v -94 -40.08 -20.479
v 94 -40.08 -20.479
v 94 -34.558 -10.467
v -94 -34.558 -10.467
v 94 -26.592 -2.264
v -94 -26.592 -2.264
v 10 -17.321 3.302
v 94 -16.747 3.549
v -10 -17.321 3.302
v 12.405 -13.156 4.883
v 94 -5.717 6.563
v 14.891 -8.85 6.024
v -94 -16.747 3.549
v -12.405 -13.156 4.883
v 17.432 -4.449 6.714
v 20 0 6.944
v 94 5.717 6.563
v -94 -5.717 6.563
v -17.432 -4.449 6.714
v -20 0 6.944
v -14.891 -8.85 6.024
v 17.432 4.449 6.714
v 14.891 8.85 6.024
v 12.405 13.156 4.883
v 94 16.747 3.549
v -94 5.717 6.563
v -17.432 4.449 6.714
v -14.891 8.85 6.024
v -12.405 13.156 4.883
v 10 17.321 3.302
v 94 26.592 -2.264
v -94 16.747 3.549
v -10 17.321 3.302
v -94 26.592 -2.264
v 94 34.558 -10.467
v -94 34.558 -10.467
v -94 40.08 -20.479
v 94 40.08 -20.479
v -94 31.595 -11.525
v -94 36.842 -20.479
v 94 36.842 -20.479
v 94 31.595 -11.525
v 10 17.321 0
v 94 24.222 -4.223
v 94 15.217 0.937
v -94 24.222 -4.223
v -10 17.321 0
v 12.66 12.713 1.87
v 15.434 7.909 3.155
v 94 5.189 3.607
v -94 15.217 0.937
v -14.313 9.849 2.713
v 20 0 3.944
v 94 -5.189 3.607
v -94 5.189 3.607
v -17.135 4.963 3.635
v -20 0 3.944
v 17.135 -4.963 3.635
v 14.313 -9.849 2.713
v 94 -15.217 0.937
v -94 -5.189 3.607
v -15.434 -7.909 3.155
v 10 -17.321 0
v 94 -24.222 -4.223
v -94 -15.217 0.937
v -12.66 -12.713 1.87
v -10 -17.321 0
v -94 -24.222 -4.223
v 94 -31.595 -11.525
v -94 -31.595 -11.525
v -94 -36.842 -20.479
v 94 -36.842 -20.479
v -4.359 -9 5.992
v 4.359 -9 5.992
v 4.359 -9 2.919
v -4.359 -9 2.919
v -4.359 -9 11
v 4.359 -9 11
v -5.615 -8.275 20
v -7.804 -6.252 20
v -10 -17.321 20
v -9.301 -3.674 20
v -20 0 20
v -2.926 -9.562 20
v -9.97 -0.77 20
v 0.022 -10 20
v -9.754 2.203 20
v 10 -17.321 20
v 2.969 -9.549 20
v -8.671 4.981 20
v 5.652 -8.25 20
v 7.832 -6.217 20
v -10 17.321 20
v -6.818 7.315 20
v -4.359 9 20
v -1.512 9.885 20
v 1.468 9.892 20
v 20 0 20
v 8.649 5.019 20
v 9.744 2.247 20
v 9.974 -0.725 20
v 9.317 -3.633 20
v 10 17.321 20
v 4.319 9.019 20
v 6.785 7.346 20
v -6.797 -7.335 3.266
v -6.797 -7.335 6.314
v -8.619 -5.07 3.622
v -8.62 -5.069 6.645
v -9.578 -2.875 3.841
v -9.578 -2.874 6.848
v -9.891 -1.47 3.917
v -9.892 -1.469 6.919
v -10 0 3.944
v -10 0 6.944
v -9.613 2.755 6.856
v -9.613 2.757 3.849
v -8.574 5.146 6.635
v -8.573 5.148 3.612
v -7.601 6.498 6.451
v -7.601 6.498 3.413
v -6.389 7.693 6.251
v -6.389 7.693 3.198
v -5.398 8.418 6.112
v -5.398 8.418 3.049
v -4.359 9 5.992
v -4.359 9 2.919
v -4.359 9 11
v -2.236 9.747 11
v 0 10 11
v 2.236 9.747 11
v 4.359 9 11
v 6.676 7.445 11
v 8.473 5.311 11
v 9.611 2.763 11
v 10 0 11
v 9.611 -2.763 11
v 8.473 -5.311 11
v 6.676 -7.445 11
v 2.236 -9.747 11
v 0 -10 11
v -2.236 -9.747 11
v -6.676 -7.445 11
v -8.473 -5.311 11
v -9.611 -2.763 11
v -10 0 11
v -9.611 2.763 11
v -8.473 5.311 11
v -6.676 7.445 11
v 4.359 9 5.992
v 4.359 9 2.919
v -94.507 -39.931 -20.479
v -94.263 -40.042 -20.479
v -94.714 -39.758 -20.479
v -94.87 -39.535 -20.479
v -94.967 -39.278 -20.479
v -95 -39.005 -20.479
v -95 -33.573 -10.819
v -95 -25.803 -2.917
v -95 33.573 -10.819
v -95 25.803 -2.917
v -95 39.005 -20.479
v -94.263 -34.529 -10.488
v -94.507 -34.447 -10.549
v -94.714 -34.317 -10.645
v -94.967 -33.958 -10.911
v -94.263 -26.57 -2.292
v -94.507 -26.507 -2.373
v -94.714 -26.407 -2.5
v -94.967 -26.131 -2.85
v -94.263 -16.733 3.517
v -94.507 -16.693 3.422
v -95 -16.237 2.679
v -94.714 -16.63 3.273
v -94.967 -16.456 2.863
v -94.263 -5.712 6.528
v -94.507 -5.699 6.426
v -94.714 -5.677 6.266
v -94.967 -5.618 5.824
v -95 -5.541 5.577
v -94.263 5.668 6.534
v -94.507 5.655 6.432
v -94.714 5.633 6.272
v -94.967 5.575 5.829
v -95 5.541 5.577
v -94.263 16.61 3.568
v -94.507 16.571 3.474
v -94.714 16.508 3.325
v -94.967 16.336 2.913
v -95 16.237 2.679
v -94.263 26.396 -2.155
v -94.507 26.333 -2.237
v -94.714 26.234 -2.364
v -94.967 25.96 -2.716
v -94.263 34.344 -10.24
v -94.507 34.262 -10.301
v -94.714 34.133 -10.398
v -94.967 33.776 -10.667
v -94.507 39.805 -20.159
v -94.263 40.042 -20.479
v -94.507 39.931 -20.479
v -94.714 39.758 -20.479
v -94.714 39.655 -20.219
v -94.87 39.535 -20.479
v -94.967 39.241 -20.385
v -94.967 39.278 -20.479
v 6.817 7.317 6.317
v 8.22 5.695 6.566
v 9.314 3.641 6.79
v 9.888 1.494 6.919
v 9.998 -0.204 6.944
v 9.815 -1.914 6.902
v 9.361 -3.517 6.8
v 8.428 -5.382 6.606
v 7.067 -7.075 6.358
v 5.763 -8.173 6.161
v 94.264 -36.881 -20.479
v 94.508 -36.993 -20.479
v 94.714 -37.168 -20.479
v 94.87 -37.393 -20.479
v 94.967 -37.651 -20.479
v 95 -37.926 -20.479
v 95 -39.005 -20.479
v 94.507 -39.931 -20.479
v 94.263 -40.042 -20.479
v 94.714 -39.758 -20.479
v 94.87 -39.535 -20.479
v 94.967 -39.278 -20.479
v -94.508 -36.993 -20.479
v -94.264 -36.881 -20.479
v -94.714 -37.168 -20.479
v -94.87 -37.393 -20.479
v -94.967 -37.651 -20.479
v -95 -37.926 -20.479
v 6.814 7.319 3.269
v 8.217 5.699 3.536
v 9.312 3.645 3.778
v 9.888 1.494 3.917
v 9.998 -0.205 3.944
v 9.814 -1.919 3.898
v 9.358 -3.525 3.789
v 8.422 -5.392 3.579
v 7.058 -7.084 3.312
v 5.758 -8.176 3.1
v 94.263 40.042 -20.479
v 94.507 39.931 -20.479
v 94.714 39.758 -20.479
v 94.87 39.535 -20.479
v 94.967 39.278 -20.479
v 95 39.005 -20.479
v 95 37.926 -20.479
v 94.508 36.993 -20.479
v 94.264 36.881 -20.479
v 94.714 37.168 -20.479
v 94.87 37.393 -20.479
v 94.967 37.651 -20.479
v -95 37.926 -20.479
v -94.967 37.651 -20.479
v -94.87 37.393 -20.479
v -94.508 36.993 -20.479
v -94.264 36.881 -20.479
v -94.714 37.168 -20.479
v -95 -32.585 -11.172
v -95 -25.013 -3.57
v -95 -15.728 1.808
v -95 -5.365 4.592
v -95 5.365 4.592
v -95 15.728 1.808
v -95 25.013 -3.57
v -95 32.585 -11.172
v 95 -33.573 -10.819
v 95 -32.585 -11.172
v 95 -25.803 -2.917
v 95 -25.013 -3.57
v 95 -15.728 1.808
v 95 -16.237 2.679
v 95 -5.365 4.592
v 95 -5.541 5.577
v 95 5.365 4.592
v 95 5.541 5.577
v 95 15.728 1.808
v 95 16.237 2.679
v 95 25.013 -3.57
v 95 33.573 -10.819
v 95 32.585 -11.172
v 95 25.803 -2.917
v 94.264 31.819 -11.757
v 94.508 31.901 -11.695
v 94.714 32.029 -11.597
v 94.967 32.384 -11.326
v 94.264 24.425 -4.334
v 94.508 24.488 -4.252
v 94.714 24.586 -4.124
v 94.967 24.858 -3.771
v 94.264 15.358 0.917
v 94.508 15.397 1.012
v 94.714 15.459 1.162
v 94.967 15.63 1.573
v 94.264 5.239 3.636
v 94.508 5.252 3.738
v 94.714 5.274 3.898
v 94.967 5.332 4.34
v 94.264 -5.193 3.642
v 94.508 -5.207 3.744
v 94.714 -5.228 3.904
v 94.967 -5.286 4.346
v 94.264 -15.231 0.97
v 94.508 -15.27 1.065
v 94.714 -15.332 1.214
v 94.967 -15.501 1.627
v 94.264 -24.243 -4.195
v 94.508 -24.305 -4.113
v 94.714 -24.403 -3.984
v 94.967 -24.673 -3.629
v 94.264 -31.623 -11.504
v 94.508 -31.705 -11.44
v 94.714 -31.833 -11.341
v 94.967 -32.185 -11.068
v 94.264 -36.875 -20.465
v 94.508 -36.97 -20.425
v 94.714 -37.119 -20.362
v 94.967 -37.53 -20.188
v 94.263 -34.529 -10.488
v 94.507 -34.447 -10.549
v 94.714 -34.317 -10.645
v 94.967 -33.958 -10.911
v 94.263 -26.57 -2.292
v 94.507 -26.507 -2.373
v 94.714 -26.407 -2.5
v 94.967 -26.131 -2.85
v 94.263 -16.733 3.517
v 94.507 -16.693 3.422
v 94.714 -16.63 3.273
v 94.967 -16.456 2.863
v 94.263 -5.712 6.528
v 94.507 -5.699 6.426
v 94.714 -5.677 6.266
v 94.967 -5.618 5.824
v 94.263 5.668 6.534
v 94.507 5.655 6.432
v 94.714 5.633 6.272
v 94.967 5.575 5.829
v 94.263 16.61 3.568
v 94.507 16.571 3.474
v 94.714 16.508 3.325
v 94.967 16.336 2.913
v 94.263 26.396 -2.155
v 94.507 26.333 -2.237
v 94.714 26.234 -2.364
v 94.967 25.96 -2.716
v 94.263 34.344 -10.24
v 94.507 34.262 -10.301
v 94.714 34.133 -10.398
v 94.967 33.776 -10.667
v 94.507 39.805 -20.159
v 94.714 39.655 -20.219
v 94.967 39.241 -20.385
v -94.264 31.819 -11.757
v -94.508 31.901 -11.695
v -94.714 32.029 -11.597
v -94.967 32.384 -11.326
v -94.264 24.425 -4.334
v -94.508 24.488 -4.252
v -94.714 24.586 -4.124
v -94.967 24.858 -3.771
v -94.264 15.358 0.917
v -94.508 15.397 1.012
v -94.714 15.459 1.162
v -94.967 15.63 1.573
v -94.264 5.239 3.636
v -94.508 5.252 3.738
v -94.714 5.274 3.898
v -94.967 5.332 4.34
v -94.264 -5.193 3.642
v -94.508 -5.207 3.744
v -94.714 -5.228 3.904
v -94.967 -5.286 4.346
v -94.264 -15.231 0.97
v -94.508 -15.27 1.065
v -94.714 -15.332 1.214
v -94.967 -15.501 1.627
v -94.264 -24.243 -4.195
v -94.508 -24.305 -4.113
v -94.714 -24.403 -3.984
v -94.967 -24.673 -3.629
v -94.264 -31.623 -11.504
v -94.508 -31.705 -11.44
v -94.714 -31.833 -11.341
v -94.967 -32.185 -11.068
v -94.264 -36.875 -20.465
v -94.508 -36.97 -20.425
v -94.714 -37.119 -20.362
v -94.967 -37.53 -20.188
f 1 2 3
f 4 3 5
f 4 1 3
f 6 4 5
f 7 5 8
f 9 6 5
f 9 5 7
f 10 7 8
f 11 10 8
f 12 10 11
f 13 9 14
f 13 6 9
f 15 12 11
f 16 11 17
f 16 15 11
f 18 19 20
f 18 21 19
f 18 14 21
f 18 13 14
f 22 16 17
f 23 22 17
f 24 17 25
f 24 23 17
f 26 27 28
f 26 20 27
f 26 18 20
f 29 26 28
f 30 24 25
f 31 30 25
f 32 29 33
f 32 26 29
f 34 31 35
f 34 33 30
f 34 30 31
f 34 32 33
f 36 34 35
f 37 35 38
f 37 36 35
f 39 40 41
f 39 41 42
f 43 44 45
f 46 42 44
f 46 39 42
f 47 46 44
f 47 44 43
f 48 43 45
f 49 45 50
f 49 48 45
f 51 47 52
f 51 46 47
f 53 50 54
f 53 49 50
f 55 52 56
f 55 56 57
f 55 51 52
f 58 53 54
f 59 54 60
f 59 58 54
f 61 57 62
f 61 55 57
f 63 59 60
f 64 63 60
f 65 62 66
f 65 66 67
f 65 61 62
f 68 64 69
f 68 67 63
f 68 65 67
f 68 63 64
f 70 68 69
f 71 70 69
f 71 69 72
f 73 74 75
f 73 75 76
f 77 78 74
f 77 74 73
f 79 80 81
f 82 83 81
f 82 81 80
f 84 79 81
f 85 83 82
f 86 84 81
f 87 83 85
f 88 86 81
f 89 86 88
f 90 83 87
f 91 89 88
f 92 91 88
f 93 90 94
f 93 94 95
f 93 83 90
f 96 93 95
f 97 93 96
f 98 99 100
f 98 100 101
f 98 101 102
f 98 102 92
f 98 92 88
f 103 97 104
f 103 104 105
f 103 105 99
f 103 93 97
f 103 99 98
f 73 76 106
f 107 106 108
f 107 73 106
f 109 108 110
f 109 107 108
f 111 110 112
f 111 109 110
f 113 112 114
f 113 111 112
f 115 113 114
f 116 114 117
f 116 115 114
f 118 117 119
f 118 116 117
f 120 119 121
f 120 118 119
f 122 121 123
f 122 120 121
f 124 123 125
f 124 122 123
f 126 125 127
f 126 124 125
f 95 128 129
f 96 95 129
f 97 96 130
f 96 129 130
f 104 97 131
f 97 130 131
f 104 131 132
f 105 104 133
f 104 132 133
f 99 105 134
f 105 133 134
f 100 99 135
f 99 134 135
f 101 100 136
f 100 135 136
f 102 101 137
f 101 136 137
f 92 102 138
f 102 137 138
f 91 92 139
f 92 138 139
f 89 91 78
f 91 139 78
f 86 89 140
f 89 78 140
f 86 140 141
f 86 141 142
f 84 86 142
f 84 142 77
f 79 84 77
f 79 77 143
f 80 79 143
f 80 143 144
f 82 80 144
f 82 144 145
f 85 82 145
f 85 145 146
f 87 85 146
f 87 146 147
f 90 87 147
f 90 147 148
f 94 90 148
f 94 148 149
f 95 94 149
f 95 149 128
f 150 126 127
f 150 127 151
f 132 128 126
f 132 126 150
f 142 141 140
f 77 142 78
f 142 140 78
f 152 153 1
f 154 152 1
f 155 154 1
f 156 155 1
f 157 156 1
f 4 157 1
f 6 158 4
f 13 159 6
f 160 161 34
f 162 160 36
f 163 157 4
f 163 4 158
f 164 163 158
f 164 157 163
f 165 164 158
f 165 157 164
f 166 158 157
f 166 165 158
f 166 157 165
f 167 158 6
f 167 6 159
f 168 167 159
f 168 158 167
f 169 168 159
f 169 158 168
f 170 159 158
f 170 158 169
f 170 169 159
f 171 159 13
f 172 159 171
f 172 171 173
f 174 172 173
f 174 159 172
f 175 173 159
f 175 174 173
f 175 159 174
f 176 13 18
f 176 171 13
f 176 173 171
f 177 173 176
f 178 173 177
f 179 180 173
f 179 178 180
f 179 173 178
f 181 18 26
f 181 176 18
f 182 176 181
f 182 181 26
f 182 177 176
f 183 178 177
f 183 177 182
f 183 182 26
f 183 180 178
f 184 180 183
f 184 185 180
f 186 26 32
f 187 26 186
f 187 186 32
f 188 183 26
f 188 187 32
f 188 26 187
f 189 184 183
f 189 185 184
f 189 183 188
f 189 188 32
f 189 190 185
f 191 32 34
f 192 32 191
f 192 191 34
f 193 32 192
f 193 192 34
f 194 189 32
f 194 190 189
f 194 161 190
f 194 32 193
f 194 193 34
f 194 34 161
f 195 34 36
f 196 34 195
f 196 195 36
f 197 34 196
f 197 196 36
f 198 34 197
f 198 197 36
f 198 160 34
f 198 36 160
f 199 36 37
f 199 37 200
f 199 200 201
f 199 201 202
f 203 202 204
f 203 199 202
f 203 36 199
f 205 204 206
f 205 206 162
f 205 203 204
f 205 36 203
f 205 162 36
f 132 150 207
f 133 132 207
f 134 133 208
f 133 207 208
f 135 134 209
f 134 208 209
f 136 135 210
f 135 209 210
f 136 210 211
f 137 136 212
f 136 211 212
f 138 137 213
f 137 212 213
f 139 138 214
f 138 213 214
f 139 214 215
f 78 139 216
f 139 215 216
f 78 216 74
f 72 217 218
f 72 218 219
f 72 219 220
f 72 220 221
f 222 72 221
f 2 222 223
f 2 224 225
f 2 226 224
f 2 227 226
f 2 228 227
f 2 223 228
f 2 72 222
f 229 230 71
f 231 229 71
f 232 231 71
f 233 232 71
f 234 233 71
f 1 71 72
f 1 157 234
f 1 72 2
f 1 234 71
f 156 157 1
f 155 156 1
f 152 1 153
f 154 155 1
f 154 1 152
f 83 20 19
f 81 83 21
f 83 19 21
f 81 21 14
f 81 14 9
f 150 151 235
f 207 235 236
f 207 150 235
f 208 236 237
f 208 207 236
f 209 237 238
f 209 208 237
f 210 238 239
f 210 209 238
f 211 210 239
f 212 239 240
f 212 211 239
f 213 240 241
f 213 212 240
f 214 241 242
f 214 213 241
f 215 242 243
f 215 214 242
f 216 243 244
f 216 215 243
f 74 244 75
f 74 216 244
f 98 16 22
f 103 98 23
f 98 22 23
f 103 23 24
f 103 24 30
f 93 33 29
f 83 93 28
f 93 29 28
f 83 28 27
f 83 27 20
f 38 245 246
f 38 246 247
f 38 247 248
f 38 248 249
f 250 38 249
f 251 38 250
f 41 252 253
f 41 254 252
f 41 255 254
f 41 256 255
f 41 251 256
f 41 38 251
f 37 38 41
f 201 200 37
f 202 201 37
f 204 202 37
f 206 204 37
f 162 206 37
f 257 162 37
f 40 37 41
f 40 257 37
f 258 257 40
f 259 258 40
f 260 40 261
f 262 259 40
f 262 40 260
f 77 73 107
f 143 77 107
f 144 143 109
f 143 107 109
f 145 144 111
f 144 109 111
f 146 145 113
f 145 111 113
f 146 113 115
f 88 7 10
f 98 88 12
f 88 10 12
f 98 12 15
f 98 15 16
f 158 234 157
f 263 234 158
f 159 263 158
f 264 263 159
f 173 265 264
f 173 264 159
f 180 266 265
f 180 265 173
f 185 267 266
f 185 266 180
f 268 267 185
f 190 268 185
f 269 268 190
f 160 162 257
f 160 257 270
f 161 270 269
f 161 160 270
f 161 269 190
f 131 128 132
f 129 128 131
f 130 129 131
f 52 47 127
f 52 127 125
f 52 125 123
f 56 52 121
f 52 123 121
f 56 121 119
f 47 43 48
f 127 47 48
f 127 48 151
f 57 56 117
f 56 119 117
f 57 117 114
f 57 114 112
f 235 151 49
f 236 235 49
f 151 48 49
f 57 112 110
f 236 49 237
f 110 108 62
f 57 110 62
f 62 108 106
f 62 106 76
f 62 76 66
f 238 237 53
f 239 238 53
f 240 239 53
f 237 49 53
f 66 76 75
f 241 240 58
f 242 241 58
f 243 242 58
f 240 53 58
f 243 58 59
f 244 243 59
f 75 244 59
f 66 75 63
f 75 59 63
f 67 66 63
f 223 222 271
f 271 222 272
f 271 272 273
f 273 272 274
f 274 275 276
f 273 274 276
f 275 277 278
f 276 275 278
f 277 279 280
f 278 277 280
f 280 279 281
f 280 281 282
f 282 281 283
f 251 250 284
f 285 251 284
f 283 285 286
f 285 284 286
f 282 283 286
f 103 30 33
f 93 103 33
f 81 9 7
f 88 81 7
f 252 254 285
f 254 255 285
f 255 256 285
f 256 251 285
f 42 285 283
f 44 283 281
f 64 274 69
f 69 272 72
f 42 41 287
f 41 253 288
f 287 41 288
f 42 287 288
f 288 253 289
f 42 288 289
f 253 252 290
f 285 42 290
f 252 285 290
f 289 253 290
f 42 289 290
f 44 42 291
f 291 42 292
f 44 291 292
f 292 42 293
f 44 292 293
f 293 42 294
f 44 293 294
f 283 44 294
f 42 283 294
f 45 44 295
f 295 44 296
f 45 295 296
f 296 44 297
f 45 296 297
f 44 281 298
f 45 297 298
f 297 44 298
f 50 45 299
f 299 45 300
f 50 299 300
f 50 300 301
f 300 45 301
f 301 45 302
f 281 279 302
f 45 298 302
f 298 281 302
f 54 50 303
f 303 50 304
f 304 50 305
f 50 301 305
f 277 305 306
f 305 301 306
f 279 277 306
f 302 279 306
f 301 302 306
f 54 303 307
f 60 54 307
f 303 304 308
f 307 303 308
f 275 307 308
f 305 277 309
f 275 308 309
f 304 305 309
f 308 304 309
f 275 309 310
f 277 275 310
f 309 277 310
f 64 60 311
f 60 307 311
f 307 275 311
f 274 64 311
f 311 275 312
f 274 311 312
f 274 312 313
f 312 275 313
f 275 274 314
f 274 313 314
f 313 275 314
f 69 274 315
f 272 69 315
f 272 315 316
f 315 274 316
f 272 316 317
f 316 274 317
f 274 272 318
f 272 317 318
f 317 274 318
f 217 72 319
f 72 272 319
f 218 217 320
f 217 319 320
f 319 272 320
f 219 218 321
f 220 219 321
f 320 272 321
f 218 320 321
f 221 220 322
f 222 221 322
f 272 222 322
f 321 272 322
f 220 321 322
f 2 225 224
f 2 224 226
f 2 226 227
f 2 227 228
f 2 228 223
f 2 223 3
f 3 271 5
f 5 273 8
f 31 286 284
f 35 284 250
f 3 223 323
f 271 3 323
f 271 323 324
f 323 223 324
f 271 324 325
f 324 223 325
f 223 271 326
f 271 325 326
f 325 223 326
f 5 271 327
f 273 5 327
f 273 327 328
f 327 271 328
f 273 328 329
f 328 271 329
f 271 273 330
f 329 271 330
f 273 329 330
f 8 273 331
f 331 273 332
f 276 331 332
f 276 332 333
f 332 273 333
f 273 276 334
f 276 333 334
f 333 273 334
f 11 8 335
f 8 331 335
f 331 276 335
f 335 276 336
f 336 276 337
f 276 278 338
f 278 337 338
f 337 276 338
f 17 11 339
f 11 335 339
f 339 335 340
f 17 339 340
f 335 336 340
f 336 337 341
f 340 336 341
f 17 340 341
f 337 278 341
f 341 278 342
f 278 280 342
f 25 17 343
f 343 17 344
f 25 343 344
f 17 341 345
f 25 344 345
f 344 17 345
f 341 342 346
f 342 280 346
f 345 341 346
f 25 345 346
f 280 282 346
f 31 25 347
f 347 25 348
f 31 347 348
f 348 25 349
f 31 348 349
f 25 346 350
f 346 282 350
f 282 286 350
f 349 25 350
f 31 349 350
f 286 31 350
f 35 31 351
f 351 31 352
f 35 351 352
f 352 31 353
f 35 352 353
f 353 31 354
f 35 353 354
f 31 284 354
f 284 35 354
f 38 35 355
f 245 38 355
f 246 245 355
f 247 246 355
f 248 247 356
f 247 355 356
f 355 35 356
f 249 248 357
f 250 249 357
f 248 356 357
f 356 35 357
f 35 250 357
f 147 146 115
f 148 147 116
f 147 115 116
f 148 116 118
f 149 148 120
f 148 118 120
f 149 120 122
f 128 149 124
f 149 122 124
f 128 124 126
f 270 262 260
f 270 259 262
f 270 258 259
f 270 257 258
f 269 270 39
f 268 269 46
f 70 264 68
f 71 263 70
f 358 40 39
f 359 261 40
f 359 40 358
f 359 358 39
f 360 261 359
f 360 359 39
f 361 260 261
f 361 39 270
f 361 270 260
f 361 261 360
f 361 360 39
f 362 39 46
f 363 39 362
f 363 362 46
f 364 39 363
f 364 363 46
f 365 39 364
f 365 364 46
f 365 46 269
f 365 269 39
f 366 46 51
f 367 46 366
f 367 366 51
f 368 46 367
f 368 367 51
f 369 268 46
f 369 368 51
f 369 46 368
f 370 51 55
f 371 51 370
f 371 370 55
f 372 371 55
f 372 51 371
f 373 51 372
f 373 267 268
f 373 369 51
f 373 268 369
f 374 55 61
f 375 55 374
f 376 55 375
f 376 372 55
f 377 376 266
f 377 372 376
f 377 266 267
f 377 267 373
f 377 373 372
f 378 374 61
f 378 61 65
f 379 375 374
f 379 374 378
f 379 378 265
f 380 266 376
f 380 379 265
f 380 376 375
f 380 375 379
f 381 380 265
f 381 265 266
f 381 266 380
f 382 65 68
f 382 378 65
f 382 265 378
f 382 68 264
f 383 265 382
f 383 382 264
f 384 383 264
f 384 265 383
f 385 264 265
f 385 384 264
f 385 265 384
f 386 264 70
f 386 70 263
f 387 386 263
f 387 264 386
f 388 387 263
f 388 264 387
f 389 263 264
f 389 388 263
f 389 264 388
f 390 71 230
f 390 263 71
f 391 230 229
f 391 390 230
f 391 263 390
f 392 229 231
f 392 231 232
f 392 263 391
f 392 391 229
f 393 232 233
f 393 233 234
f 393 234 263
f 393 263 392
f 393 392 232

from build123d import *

# Parameters (mm, degrees)
BOSS_EXTRUDE1_DEPTH      = 20
CUT_EXTRUDE1_DEPTH       = 11
SKETCH4_R                = 10
CUT_EXTRUDE2_DEPTH       = 11
BOSS_EXTRUDE2_DEPTH      = 95
BOSS_EXTRUDE2_DEPTH_BACK = 95
SKETCH6_R                = 40
CUT_EXTRUDE3_DEPTH       = 196.258176901
CUT_EXTRUDE4_DEPTH       = 108.806733567
FILLET1_R                = 1


with BuildPart() as part:
    # Sketch1 → Boss-Extrude1 (new body)
    with BuildSketch(Plane.XY):
        Polygon((10, -17.320508076), (20, 0), (10, 17.320508076), (-10, 17.320508076), (-20, 0), (-10, -17.320508076), align=None)
    extrude(amount=BOSS_EXTRUDE1_DEPTH)

    # Sketch3 → Cut-Extrude1 (cut)
    with BuildSketch(Plane(origin=(0, 0, 0), x_dir=(-1, 0, 0), z_dir=(0, 0, -1))):
        with BuildLine():
            Line((4.358898944, 9), (-4.358898944, 9))
            ThreePointArc((-4.358898944, 9), (-10, 0), (-4.358898944, -9))
            Line((-4.358898944, -9), (4.358898944, -9))
            ThreePointArc((4.358898944, -9), (8.473163206, -5.310885546), (10, 0))
            ThreePointArc((10, 0), (8.473163206, 5.310885546), (4.358898944, 9))
        make_face()
    extrude(amount=-CUT_EXTRUDE1_DEPTH, mode=Mode.SUBTRACT)

    # Sketch4 → Cut-Extrude2 (cut)
    with BuildSketch(Plane(origin=(0, 0, 11), x_dir=(-1, 0, 0), z_dir=(0, 0, -1))):
        Circle(SKETCH4_R)
    extrude(amount=-CUT_EXTRUDE2_DEPTH, mode=Mode.SUBTRACT)

    # Sketch5 → Boss-Extrude2 (add, two sides: drawn at the far end of the back side and taken through both)
    with BuildSketch(Plane(origin=(0, 0, 0), x_dir=(0, 0, -1), z_dir=(1, 0, 0)).offset(-BOSS_EXTRUDE2_DEPTH_BACK)):
        with BuildLine():
            Line((20.478916174, 40.079541402), (20.478916174, 36.84249773))
            ThreePointArc((20.478916174, 36.84249773), (-3.944487245, 0), (20.478916174, -36.84249773))
            Line((20.478916174, -36.84249773), (20.478916174, -40.079541402))
            ThreePointArc((20.478916174, -40.079541402), (-6.944487245, 0), (20.478916174, 40.079541402))
        make_face()
    extrude(amount=BOSS_EXTRUDE2_DEPTH + BOSS_EXTRUDE2_DEPTH_BACK)

    # Sketch6 → Cut-Extrude3 (cut, through all)
    with BuildSketch(Plane(origin=(95, 0, 0), x_dir=(0, 0, -1), z_dir=(1, 0, 0))):
        with Locations((36.055512755, 0)):
            Circle(SKETCH6_R)
    extrude(amount=-CUT_EXTRUDE3_DEPTH, mode=Mode.SUBTRACT)

    # Sketch7 → Cut-Extrude4 (cut, through all)
    with BuildSketch(Plane.XY.offset(11)):
        with BuildLine():
            Line((-4.358898944, 9), (4.358898944, 9))
            ThreePointArc((4.358898944, 9), (10, 0), (4.358898944, -9))
            Line((4.358898944, -9), (-4.358898944, -9))
            ThreePointArc((-4.358898944, -9), (-10, 0), (-4.358898944, 9))
        make_face()
    extrude(amount=-CUT_EXTRUDE4_DEPTH, mode=Mode.SUBTRACT)

    # Fillet1
    fillet1_edges = [part.edges().sort_by_distance(p)[0] for p in [
        (-95, 0, 6.944487245),
        (-95, 0, 3.944487245),
        (95, 0, 6.944487245),
        (95, 0, 3.944487245),
    ]]
    fillet(fillet1_edges, radius=FILLET1_R)


solid = part.part
